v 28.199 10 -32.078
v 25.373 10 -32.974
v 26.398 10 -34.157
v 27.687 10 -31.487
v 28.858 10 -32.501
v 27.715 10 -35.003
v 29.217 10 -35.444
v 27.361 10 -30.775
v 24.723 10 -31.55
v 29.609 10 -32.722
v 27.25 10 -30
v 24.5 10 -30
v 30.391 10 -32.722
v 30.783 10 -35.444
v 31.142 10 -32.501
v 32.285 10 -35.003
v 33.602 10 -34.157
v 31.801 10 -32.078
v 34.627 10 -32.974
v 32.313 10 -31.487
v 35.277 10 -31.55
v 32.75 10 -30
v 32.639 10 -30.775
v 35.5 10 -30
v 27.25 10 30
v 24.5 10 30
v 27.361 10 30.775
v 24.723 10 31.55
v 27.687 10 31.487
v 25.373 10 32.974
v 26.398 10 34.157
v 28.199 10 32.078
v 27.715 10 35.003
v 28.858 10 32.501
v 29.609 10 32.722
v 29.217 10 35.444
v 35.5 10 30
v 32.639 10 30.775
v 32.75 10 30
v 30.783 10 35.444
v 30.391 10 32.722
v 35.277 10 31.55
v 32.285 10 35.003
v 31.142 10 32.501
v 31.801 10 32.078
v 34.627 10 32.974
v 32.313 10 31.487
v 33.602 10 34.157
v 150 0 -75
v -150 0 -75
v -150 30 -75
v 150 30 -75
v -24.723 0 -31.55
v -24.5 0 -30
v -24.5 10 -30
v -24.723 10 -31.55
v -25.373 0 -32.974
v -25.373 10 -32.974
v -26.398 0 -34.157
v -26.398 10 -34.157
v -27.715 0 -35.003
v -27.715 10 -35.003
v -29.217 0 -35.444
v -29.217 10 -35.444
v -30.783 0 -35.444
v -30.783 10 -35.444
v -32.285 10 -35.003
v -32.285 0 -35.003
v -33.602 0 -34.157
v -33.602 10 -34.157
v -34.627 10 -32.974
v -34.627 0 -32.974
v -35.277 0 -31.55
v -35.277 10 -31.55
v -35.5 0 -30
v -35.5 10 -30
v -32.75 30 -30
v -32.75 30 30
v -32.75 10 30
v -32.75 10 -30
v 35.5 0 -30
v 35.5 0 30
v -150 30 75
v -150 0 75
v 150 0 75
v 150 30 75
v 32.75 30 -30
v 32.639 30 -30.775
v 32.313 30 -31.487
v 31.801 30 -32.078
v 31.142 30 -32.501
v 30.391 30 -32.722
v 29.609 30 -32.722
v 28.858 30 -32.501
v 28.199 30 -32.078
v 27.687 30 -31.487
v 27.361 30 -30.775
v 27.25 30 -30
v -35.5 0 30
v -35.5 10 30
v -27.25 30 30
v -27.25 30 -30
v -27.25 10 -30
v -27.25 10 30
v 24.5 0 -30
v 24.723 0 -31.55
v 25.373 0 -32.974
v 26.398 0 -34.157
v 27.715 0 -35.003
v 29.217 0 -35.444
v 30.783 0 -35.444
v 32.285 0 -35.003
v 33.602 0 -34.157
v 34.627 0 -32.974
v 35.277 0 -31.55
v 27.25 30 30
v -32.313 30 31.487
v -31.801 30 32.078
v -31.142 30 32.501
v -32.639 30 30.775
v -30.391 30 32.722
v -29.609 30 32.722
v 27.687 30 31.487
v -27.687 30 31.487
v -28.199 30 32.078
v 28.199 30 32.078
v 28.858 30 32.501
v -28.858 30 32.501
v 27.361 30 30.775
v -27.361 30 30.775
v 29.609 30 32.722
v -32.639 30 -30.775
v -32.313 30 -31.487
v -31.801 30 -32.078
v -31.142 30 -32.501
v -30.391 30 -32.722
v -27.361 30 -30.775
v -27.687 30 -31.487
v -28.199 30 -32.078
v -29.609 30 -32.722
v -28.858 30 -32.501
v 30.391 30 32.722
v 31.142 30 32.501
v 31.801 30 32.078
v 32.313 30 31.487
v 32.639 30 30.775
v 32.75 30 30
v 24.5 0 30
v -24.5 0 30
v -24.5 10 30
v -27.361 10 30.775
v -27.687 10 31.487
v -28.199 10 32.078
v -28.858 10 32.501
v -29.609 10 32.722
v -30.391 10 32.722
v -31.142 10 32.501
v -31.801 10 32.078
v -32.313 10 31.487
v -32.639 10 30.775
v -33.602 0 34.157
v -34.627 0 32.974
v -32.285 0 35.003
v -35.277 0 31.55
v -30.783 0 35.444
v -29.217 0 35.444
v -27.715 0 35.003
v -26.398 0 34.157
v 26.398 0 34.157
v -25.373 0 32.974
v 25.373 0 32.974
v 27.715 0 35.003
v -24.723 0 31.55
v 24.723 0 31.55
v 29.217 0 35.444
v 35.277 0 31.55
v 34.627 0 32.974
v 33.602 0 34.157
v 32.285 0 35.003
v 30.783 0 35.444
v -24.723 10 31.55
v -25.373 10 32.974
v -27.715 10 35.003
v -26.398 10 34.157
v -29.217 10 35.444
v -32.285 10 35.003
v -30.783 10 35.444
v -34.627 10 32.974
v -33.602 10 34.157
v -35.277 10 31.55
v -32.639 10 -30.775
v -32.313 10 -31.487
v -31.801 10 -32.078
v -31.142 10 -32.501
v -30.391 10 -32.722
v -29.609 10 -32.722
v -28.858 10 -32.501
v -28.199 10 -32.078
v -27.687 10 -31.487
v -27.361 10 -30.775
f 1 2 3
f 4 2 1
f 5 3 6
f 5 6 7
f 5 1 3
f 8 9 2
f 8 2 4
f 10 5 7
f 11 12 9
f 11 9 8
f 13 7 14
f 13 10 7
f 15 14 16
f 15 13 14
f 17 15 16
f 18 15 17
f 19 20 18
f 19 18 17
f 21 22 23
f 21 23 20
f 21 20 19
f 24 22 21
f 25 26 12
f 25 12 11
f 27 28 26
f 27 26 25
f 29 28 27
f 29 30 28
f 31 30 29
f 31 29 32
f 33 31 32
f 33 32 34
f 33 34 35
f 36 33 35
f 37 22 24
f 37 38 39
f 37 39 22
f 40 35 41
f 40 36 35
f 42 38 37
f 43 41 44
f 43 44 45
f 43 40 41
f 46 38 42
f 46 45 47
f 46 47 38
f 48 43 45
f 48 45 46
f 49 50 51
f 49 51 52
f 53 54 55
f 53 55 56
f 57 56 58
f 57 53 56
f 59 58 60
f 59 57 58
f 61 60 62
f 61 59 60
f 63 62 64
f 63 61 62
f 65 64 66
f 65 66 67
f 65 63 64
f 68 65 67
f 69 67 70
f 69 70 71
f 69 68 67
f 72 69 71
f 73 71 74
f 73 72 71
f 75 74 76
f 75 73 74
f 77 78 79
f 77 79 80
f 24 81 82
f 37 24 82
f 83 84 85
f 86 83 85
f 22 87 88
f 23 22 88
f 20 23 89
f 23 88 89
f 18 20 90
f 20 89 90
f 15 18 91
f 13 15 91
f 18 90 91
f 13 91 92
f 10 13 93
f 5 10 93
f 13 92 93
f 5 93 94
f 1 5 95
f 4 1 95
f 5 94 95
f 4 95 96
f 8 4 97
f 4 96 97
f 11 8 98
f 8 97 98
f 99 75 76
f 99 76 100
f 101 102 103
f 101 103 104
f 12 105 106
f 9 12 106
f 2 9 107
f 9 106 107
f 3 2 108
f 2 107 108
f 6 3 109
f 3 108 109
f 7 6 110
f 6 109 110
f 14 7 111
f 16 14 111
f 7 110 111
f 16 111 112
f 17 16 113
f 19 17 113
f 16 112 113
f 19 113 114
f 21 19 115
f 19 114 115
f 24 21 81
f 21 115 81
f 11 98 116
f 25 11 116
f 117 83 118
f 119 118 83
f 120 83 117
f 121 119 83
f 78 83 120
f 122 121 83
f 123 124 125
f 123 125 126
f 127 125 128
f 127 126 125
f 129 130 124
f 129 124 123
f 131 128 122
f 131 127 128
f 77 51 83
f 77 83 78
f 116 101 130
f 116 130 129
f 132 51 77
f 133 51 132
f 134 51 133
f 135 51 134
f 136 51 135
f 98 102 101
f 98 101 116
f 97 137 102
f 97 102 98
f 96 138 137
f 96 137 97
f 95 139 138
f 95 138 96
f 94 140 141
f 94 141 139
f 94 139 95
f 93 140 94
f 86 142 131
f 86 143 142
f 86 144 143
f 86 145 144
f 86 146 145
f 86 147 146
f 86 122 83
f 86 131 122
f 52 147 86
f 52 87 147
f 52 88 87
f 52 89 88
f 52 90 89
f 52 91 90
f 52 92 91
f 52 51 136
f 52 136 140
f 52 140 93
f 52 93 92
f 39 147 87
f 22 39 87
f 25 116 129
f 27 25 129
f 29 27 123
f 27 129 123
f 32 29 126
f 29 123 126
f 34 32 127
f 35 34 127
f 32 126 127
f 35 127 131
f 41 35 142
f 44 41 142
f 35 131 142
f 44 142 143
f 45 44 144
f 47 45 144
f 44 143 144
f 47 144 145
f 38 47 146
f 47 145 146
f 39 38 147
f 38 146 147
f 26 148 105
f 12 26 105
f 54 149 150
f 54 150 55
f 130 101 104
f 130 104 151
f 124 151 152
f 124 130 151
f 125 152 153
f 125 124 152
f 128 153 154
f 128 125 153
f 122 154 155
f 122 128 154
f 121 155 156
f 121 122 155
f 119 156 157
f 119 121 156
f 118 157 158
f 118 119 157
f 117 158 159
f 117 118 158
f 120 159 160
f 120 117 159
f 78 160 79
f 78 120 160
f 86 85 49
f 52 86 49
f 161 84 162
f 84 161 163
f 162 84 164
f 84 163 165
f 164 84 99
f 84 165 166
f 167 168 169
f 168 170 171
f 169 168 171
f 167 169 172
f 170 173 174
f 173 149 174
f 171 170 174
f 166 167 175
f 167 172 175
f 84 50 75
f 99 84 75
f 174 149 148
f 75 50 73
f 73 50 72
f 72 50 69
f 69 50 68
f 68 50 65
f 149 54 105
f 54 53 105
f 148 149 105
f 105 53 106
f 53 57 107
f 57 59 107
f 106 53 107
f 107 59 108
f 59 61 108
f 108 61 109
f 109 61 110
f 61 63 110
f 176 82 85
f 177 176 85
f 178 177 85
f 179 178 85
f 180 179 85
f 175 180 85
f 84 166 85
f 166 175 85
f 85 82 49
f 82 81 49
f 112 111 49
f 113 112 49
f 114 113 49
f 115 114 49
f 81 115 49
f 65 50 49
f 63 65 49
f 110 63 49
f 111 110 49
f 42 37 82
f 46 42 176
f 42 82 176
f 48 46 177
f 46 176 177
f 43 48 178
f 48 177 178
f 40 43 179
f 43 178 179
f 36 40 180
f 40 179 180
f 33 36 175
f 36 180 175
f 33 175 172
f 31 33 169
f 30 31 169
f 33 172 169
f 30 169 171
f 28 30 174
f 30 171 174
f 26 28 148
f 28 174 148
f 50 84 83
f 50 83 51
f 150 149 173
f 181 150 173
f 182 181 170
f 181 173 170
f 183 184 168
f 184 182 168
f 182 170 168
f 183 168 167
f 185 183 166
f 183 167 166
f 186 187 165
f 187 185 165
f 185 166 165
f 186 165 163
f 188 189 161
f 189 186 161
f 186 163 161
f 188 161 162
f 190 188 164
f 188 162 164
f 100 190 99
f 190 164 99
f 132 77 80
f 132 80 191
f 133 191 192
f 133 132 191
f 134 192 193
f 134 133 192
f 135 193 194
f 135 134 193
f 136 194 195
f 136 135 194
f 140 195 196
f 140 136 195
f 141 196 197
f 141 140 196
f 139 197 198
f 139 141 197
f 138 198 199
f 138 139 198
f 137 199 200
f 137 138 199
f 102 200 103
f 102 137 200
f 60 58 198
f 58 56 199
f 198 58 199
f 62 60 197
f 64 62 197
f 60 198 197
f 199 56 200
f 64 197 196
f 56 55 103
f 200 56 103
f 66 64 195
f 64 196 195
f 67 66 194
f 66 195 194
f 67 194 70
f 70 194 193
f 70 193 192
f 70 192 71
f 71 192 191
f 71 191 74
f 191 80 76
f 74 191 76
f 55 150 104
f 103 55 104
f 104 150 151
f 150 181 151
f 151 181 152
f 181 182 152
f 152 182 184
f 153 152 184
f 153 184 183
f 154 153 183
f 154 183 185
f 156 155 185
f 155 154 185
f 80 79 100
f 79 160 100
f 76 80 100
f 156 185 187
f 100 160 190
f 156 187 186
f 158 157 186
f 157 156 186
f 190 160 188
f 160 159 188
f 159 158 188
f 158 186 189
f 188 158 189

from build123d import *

# Parameters (mm, degrees)
SKETCH1_W                                        = 300
SKETCH1_H                                        = 150
BOSS_EXTRUDE1_DEPTH                              = 30
CUT_EXTRUDE2_DEPTH                               = 30
CBORE_FOR_M5_PAN_HEAD_MACHINE_SCREW1_D           = 5.5
CBORE_FOR_M5_PAN_HEAD_MACHINE_SCREW1_DEPTH       = 110
CBORE_FOR_M5_PAN_HEAD_MACHINE_SCREW1_CBORE_D     = 11
CBORE_FOR_M5_PAN_HEAD_MACHINE_SCREW1_CBORE_DEPTH = 3.7
CUT_EXTRUDE3_DEPTH                               = 10


with BuildPart() as part:
    # Sketch1 → Boss-Extrude1 (new body)
    with BuildSketch(Plane(origin=(0, 0, 0), x_dir=(1, 0, 0), z_dir=(0, 1, 0))):
        Rectangle(SKETCH1_W, SKETCH1_H)
    extrude(amount=BOSS_EXTRUDE1_DEPTH)

    # Sketch4 → Cut-Extrude2 (cut)
    with BuildSketch(Plane(origin=(0, 30, 0), x_dir=(1, 0, 0), z_dir=(0, 1, 0))):
        with BuildLine():
            Line((-32.75, -30), (-32.75, 30))
            ThreePointArc((-32.75, 30), (-30, 32.75), (-27.25, 30))
            Line((-27.25, 30), (-27.25, -30))
            ThreePointArc((-27.25, -30), (-30, -32.75), (-32.75, -30))
        make_face()
        with BuildLine():
            Line((32.75, -30), (32.75, 30))
            ThreePointArc((32.75, 30), (30, 32.75), (27.25, 30))
            Line((27.25, 30), (27.25, -30))
            ThreePointArc((27.25, -30), (30, -32.75), (32.75, -30))
        make_face()
    extrude(amount=-CUT_EXTRUDE2_DEPTH, mode=Mode.SUBTRACT)

    # CBORE for M5 Pan Head Machine Screw1
    with Locations(Plane(origin=(0, 0, 0), x_dir=(-1, 0, 0), z_dir=(0, -1, 0))):
        with Locations((30, -30), (-30, -30)):
            CounterBoreHole(CBORE_FOR_M5_PAN_HEAD_MACHINE_SCREW1_D / 2, CBORE_FOR_M5_PAN_HEAD_MACHINE_SCREW1_CBORE_D / 2, CBORE_FOR_M5_PAN_HEAD_MACHINE_SCREW1_CBORE_DEPTH, depth=CBORE_FOR_M5_PAN_HEAD_MACHINE_SCREW1_DEPTH)

    # Sketch8 → Cut-Extrude3 (cut)
    with BuildSketch(Plane.XZ):
        with BuildLine():
            Line((-24.5, 30), (-24.5, -30))
            ThreePointArc((-24.5, -30), (-30, -35.5), (-35.5, -30))
            Line((-35.5, -30), (-35.5, 30))
            ThreePointArc((-35.5, 30), (-30, 35.5), (-24.5, 30))
        make_face()
        with BuildLine():
            Line((24.5, 30), (24.5, -30))
            ThreePointArc((24.5, -30), (30, -35.5), (35.5, -30))
            Line((35.5, -30), (35.5, 30))
            ThreePointArc((35.5, 30), (30, 35.5), (24.5, 30))
        make_face()
    extrude(amount=-CUT_EXTRUDE3_DEPTH, mode=Mode.SUBTRACT)


solid = part.part
